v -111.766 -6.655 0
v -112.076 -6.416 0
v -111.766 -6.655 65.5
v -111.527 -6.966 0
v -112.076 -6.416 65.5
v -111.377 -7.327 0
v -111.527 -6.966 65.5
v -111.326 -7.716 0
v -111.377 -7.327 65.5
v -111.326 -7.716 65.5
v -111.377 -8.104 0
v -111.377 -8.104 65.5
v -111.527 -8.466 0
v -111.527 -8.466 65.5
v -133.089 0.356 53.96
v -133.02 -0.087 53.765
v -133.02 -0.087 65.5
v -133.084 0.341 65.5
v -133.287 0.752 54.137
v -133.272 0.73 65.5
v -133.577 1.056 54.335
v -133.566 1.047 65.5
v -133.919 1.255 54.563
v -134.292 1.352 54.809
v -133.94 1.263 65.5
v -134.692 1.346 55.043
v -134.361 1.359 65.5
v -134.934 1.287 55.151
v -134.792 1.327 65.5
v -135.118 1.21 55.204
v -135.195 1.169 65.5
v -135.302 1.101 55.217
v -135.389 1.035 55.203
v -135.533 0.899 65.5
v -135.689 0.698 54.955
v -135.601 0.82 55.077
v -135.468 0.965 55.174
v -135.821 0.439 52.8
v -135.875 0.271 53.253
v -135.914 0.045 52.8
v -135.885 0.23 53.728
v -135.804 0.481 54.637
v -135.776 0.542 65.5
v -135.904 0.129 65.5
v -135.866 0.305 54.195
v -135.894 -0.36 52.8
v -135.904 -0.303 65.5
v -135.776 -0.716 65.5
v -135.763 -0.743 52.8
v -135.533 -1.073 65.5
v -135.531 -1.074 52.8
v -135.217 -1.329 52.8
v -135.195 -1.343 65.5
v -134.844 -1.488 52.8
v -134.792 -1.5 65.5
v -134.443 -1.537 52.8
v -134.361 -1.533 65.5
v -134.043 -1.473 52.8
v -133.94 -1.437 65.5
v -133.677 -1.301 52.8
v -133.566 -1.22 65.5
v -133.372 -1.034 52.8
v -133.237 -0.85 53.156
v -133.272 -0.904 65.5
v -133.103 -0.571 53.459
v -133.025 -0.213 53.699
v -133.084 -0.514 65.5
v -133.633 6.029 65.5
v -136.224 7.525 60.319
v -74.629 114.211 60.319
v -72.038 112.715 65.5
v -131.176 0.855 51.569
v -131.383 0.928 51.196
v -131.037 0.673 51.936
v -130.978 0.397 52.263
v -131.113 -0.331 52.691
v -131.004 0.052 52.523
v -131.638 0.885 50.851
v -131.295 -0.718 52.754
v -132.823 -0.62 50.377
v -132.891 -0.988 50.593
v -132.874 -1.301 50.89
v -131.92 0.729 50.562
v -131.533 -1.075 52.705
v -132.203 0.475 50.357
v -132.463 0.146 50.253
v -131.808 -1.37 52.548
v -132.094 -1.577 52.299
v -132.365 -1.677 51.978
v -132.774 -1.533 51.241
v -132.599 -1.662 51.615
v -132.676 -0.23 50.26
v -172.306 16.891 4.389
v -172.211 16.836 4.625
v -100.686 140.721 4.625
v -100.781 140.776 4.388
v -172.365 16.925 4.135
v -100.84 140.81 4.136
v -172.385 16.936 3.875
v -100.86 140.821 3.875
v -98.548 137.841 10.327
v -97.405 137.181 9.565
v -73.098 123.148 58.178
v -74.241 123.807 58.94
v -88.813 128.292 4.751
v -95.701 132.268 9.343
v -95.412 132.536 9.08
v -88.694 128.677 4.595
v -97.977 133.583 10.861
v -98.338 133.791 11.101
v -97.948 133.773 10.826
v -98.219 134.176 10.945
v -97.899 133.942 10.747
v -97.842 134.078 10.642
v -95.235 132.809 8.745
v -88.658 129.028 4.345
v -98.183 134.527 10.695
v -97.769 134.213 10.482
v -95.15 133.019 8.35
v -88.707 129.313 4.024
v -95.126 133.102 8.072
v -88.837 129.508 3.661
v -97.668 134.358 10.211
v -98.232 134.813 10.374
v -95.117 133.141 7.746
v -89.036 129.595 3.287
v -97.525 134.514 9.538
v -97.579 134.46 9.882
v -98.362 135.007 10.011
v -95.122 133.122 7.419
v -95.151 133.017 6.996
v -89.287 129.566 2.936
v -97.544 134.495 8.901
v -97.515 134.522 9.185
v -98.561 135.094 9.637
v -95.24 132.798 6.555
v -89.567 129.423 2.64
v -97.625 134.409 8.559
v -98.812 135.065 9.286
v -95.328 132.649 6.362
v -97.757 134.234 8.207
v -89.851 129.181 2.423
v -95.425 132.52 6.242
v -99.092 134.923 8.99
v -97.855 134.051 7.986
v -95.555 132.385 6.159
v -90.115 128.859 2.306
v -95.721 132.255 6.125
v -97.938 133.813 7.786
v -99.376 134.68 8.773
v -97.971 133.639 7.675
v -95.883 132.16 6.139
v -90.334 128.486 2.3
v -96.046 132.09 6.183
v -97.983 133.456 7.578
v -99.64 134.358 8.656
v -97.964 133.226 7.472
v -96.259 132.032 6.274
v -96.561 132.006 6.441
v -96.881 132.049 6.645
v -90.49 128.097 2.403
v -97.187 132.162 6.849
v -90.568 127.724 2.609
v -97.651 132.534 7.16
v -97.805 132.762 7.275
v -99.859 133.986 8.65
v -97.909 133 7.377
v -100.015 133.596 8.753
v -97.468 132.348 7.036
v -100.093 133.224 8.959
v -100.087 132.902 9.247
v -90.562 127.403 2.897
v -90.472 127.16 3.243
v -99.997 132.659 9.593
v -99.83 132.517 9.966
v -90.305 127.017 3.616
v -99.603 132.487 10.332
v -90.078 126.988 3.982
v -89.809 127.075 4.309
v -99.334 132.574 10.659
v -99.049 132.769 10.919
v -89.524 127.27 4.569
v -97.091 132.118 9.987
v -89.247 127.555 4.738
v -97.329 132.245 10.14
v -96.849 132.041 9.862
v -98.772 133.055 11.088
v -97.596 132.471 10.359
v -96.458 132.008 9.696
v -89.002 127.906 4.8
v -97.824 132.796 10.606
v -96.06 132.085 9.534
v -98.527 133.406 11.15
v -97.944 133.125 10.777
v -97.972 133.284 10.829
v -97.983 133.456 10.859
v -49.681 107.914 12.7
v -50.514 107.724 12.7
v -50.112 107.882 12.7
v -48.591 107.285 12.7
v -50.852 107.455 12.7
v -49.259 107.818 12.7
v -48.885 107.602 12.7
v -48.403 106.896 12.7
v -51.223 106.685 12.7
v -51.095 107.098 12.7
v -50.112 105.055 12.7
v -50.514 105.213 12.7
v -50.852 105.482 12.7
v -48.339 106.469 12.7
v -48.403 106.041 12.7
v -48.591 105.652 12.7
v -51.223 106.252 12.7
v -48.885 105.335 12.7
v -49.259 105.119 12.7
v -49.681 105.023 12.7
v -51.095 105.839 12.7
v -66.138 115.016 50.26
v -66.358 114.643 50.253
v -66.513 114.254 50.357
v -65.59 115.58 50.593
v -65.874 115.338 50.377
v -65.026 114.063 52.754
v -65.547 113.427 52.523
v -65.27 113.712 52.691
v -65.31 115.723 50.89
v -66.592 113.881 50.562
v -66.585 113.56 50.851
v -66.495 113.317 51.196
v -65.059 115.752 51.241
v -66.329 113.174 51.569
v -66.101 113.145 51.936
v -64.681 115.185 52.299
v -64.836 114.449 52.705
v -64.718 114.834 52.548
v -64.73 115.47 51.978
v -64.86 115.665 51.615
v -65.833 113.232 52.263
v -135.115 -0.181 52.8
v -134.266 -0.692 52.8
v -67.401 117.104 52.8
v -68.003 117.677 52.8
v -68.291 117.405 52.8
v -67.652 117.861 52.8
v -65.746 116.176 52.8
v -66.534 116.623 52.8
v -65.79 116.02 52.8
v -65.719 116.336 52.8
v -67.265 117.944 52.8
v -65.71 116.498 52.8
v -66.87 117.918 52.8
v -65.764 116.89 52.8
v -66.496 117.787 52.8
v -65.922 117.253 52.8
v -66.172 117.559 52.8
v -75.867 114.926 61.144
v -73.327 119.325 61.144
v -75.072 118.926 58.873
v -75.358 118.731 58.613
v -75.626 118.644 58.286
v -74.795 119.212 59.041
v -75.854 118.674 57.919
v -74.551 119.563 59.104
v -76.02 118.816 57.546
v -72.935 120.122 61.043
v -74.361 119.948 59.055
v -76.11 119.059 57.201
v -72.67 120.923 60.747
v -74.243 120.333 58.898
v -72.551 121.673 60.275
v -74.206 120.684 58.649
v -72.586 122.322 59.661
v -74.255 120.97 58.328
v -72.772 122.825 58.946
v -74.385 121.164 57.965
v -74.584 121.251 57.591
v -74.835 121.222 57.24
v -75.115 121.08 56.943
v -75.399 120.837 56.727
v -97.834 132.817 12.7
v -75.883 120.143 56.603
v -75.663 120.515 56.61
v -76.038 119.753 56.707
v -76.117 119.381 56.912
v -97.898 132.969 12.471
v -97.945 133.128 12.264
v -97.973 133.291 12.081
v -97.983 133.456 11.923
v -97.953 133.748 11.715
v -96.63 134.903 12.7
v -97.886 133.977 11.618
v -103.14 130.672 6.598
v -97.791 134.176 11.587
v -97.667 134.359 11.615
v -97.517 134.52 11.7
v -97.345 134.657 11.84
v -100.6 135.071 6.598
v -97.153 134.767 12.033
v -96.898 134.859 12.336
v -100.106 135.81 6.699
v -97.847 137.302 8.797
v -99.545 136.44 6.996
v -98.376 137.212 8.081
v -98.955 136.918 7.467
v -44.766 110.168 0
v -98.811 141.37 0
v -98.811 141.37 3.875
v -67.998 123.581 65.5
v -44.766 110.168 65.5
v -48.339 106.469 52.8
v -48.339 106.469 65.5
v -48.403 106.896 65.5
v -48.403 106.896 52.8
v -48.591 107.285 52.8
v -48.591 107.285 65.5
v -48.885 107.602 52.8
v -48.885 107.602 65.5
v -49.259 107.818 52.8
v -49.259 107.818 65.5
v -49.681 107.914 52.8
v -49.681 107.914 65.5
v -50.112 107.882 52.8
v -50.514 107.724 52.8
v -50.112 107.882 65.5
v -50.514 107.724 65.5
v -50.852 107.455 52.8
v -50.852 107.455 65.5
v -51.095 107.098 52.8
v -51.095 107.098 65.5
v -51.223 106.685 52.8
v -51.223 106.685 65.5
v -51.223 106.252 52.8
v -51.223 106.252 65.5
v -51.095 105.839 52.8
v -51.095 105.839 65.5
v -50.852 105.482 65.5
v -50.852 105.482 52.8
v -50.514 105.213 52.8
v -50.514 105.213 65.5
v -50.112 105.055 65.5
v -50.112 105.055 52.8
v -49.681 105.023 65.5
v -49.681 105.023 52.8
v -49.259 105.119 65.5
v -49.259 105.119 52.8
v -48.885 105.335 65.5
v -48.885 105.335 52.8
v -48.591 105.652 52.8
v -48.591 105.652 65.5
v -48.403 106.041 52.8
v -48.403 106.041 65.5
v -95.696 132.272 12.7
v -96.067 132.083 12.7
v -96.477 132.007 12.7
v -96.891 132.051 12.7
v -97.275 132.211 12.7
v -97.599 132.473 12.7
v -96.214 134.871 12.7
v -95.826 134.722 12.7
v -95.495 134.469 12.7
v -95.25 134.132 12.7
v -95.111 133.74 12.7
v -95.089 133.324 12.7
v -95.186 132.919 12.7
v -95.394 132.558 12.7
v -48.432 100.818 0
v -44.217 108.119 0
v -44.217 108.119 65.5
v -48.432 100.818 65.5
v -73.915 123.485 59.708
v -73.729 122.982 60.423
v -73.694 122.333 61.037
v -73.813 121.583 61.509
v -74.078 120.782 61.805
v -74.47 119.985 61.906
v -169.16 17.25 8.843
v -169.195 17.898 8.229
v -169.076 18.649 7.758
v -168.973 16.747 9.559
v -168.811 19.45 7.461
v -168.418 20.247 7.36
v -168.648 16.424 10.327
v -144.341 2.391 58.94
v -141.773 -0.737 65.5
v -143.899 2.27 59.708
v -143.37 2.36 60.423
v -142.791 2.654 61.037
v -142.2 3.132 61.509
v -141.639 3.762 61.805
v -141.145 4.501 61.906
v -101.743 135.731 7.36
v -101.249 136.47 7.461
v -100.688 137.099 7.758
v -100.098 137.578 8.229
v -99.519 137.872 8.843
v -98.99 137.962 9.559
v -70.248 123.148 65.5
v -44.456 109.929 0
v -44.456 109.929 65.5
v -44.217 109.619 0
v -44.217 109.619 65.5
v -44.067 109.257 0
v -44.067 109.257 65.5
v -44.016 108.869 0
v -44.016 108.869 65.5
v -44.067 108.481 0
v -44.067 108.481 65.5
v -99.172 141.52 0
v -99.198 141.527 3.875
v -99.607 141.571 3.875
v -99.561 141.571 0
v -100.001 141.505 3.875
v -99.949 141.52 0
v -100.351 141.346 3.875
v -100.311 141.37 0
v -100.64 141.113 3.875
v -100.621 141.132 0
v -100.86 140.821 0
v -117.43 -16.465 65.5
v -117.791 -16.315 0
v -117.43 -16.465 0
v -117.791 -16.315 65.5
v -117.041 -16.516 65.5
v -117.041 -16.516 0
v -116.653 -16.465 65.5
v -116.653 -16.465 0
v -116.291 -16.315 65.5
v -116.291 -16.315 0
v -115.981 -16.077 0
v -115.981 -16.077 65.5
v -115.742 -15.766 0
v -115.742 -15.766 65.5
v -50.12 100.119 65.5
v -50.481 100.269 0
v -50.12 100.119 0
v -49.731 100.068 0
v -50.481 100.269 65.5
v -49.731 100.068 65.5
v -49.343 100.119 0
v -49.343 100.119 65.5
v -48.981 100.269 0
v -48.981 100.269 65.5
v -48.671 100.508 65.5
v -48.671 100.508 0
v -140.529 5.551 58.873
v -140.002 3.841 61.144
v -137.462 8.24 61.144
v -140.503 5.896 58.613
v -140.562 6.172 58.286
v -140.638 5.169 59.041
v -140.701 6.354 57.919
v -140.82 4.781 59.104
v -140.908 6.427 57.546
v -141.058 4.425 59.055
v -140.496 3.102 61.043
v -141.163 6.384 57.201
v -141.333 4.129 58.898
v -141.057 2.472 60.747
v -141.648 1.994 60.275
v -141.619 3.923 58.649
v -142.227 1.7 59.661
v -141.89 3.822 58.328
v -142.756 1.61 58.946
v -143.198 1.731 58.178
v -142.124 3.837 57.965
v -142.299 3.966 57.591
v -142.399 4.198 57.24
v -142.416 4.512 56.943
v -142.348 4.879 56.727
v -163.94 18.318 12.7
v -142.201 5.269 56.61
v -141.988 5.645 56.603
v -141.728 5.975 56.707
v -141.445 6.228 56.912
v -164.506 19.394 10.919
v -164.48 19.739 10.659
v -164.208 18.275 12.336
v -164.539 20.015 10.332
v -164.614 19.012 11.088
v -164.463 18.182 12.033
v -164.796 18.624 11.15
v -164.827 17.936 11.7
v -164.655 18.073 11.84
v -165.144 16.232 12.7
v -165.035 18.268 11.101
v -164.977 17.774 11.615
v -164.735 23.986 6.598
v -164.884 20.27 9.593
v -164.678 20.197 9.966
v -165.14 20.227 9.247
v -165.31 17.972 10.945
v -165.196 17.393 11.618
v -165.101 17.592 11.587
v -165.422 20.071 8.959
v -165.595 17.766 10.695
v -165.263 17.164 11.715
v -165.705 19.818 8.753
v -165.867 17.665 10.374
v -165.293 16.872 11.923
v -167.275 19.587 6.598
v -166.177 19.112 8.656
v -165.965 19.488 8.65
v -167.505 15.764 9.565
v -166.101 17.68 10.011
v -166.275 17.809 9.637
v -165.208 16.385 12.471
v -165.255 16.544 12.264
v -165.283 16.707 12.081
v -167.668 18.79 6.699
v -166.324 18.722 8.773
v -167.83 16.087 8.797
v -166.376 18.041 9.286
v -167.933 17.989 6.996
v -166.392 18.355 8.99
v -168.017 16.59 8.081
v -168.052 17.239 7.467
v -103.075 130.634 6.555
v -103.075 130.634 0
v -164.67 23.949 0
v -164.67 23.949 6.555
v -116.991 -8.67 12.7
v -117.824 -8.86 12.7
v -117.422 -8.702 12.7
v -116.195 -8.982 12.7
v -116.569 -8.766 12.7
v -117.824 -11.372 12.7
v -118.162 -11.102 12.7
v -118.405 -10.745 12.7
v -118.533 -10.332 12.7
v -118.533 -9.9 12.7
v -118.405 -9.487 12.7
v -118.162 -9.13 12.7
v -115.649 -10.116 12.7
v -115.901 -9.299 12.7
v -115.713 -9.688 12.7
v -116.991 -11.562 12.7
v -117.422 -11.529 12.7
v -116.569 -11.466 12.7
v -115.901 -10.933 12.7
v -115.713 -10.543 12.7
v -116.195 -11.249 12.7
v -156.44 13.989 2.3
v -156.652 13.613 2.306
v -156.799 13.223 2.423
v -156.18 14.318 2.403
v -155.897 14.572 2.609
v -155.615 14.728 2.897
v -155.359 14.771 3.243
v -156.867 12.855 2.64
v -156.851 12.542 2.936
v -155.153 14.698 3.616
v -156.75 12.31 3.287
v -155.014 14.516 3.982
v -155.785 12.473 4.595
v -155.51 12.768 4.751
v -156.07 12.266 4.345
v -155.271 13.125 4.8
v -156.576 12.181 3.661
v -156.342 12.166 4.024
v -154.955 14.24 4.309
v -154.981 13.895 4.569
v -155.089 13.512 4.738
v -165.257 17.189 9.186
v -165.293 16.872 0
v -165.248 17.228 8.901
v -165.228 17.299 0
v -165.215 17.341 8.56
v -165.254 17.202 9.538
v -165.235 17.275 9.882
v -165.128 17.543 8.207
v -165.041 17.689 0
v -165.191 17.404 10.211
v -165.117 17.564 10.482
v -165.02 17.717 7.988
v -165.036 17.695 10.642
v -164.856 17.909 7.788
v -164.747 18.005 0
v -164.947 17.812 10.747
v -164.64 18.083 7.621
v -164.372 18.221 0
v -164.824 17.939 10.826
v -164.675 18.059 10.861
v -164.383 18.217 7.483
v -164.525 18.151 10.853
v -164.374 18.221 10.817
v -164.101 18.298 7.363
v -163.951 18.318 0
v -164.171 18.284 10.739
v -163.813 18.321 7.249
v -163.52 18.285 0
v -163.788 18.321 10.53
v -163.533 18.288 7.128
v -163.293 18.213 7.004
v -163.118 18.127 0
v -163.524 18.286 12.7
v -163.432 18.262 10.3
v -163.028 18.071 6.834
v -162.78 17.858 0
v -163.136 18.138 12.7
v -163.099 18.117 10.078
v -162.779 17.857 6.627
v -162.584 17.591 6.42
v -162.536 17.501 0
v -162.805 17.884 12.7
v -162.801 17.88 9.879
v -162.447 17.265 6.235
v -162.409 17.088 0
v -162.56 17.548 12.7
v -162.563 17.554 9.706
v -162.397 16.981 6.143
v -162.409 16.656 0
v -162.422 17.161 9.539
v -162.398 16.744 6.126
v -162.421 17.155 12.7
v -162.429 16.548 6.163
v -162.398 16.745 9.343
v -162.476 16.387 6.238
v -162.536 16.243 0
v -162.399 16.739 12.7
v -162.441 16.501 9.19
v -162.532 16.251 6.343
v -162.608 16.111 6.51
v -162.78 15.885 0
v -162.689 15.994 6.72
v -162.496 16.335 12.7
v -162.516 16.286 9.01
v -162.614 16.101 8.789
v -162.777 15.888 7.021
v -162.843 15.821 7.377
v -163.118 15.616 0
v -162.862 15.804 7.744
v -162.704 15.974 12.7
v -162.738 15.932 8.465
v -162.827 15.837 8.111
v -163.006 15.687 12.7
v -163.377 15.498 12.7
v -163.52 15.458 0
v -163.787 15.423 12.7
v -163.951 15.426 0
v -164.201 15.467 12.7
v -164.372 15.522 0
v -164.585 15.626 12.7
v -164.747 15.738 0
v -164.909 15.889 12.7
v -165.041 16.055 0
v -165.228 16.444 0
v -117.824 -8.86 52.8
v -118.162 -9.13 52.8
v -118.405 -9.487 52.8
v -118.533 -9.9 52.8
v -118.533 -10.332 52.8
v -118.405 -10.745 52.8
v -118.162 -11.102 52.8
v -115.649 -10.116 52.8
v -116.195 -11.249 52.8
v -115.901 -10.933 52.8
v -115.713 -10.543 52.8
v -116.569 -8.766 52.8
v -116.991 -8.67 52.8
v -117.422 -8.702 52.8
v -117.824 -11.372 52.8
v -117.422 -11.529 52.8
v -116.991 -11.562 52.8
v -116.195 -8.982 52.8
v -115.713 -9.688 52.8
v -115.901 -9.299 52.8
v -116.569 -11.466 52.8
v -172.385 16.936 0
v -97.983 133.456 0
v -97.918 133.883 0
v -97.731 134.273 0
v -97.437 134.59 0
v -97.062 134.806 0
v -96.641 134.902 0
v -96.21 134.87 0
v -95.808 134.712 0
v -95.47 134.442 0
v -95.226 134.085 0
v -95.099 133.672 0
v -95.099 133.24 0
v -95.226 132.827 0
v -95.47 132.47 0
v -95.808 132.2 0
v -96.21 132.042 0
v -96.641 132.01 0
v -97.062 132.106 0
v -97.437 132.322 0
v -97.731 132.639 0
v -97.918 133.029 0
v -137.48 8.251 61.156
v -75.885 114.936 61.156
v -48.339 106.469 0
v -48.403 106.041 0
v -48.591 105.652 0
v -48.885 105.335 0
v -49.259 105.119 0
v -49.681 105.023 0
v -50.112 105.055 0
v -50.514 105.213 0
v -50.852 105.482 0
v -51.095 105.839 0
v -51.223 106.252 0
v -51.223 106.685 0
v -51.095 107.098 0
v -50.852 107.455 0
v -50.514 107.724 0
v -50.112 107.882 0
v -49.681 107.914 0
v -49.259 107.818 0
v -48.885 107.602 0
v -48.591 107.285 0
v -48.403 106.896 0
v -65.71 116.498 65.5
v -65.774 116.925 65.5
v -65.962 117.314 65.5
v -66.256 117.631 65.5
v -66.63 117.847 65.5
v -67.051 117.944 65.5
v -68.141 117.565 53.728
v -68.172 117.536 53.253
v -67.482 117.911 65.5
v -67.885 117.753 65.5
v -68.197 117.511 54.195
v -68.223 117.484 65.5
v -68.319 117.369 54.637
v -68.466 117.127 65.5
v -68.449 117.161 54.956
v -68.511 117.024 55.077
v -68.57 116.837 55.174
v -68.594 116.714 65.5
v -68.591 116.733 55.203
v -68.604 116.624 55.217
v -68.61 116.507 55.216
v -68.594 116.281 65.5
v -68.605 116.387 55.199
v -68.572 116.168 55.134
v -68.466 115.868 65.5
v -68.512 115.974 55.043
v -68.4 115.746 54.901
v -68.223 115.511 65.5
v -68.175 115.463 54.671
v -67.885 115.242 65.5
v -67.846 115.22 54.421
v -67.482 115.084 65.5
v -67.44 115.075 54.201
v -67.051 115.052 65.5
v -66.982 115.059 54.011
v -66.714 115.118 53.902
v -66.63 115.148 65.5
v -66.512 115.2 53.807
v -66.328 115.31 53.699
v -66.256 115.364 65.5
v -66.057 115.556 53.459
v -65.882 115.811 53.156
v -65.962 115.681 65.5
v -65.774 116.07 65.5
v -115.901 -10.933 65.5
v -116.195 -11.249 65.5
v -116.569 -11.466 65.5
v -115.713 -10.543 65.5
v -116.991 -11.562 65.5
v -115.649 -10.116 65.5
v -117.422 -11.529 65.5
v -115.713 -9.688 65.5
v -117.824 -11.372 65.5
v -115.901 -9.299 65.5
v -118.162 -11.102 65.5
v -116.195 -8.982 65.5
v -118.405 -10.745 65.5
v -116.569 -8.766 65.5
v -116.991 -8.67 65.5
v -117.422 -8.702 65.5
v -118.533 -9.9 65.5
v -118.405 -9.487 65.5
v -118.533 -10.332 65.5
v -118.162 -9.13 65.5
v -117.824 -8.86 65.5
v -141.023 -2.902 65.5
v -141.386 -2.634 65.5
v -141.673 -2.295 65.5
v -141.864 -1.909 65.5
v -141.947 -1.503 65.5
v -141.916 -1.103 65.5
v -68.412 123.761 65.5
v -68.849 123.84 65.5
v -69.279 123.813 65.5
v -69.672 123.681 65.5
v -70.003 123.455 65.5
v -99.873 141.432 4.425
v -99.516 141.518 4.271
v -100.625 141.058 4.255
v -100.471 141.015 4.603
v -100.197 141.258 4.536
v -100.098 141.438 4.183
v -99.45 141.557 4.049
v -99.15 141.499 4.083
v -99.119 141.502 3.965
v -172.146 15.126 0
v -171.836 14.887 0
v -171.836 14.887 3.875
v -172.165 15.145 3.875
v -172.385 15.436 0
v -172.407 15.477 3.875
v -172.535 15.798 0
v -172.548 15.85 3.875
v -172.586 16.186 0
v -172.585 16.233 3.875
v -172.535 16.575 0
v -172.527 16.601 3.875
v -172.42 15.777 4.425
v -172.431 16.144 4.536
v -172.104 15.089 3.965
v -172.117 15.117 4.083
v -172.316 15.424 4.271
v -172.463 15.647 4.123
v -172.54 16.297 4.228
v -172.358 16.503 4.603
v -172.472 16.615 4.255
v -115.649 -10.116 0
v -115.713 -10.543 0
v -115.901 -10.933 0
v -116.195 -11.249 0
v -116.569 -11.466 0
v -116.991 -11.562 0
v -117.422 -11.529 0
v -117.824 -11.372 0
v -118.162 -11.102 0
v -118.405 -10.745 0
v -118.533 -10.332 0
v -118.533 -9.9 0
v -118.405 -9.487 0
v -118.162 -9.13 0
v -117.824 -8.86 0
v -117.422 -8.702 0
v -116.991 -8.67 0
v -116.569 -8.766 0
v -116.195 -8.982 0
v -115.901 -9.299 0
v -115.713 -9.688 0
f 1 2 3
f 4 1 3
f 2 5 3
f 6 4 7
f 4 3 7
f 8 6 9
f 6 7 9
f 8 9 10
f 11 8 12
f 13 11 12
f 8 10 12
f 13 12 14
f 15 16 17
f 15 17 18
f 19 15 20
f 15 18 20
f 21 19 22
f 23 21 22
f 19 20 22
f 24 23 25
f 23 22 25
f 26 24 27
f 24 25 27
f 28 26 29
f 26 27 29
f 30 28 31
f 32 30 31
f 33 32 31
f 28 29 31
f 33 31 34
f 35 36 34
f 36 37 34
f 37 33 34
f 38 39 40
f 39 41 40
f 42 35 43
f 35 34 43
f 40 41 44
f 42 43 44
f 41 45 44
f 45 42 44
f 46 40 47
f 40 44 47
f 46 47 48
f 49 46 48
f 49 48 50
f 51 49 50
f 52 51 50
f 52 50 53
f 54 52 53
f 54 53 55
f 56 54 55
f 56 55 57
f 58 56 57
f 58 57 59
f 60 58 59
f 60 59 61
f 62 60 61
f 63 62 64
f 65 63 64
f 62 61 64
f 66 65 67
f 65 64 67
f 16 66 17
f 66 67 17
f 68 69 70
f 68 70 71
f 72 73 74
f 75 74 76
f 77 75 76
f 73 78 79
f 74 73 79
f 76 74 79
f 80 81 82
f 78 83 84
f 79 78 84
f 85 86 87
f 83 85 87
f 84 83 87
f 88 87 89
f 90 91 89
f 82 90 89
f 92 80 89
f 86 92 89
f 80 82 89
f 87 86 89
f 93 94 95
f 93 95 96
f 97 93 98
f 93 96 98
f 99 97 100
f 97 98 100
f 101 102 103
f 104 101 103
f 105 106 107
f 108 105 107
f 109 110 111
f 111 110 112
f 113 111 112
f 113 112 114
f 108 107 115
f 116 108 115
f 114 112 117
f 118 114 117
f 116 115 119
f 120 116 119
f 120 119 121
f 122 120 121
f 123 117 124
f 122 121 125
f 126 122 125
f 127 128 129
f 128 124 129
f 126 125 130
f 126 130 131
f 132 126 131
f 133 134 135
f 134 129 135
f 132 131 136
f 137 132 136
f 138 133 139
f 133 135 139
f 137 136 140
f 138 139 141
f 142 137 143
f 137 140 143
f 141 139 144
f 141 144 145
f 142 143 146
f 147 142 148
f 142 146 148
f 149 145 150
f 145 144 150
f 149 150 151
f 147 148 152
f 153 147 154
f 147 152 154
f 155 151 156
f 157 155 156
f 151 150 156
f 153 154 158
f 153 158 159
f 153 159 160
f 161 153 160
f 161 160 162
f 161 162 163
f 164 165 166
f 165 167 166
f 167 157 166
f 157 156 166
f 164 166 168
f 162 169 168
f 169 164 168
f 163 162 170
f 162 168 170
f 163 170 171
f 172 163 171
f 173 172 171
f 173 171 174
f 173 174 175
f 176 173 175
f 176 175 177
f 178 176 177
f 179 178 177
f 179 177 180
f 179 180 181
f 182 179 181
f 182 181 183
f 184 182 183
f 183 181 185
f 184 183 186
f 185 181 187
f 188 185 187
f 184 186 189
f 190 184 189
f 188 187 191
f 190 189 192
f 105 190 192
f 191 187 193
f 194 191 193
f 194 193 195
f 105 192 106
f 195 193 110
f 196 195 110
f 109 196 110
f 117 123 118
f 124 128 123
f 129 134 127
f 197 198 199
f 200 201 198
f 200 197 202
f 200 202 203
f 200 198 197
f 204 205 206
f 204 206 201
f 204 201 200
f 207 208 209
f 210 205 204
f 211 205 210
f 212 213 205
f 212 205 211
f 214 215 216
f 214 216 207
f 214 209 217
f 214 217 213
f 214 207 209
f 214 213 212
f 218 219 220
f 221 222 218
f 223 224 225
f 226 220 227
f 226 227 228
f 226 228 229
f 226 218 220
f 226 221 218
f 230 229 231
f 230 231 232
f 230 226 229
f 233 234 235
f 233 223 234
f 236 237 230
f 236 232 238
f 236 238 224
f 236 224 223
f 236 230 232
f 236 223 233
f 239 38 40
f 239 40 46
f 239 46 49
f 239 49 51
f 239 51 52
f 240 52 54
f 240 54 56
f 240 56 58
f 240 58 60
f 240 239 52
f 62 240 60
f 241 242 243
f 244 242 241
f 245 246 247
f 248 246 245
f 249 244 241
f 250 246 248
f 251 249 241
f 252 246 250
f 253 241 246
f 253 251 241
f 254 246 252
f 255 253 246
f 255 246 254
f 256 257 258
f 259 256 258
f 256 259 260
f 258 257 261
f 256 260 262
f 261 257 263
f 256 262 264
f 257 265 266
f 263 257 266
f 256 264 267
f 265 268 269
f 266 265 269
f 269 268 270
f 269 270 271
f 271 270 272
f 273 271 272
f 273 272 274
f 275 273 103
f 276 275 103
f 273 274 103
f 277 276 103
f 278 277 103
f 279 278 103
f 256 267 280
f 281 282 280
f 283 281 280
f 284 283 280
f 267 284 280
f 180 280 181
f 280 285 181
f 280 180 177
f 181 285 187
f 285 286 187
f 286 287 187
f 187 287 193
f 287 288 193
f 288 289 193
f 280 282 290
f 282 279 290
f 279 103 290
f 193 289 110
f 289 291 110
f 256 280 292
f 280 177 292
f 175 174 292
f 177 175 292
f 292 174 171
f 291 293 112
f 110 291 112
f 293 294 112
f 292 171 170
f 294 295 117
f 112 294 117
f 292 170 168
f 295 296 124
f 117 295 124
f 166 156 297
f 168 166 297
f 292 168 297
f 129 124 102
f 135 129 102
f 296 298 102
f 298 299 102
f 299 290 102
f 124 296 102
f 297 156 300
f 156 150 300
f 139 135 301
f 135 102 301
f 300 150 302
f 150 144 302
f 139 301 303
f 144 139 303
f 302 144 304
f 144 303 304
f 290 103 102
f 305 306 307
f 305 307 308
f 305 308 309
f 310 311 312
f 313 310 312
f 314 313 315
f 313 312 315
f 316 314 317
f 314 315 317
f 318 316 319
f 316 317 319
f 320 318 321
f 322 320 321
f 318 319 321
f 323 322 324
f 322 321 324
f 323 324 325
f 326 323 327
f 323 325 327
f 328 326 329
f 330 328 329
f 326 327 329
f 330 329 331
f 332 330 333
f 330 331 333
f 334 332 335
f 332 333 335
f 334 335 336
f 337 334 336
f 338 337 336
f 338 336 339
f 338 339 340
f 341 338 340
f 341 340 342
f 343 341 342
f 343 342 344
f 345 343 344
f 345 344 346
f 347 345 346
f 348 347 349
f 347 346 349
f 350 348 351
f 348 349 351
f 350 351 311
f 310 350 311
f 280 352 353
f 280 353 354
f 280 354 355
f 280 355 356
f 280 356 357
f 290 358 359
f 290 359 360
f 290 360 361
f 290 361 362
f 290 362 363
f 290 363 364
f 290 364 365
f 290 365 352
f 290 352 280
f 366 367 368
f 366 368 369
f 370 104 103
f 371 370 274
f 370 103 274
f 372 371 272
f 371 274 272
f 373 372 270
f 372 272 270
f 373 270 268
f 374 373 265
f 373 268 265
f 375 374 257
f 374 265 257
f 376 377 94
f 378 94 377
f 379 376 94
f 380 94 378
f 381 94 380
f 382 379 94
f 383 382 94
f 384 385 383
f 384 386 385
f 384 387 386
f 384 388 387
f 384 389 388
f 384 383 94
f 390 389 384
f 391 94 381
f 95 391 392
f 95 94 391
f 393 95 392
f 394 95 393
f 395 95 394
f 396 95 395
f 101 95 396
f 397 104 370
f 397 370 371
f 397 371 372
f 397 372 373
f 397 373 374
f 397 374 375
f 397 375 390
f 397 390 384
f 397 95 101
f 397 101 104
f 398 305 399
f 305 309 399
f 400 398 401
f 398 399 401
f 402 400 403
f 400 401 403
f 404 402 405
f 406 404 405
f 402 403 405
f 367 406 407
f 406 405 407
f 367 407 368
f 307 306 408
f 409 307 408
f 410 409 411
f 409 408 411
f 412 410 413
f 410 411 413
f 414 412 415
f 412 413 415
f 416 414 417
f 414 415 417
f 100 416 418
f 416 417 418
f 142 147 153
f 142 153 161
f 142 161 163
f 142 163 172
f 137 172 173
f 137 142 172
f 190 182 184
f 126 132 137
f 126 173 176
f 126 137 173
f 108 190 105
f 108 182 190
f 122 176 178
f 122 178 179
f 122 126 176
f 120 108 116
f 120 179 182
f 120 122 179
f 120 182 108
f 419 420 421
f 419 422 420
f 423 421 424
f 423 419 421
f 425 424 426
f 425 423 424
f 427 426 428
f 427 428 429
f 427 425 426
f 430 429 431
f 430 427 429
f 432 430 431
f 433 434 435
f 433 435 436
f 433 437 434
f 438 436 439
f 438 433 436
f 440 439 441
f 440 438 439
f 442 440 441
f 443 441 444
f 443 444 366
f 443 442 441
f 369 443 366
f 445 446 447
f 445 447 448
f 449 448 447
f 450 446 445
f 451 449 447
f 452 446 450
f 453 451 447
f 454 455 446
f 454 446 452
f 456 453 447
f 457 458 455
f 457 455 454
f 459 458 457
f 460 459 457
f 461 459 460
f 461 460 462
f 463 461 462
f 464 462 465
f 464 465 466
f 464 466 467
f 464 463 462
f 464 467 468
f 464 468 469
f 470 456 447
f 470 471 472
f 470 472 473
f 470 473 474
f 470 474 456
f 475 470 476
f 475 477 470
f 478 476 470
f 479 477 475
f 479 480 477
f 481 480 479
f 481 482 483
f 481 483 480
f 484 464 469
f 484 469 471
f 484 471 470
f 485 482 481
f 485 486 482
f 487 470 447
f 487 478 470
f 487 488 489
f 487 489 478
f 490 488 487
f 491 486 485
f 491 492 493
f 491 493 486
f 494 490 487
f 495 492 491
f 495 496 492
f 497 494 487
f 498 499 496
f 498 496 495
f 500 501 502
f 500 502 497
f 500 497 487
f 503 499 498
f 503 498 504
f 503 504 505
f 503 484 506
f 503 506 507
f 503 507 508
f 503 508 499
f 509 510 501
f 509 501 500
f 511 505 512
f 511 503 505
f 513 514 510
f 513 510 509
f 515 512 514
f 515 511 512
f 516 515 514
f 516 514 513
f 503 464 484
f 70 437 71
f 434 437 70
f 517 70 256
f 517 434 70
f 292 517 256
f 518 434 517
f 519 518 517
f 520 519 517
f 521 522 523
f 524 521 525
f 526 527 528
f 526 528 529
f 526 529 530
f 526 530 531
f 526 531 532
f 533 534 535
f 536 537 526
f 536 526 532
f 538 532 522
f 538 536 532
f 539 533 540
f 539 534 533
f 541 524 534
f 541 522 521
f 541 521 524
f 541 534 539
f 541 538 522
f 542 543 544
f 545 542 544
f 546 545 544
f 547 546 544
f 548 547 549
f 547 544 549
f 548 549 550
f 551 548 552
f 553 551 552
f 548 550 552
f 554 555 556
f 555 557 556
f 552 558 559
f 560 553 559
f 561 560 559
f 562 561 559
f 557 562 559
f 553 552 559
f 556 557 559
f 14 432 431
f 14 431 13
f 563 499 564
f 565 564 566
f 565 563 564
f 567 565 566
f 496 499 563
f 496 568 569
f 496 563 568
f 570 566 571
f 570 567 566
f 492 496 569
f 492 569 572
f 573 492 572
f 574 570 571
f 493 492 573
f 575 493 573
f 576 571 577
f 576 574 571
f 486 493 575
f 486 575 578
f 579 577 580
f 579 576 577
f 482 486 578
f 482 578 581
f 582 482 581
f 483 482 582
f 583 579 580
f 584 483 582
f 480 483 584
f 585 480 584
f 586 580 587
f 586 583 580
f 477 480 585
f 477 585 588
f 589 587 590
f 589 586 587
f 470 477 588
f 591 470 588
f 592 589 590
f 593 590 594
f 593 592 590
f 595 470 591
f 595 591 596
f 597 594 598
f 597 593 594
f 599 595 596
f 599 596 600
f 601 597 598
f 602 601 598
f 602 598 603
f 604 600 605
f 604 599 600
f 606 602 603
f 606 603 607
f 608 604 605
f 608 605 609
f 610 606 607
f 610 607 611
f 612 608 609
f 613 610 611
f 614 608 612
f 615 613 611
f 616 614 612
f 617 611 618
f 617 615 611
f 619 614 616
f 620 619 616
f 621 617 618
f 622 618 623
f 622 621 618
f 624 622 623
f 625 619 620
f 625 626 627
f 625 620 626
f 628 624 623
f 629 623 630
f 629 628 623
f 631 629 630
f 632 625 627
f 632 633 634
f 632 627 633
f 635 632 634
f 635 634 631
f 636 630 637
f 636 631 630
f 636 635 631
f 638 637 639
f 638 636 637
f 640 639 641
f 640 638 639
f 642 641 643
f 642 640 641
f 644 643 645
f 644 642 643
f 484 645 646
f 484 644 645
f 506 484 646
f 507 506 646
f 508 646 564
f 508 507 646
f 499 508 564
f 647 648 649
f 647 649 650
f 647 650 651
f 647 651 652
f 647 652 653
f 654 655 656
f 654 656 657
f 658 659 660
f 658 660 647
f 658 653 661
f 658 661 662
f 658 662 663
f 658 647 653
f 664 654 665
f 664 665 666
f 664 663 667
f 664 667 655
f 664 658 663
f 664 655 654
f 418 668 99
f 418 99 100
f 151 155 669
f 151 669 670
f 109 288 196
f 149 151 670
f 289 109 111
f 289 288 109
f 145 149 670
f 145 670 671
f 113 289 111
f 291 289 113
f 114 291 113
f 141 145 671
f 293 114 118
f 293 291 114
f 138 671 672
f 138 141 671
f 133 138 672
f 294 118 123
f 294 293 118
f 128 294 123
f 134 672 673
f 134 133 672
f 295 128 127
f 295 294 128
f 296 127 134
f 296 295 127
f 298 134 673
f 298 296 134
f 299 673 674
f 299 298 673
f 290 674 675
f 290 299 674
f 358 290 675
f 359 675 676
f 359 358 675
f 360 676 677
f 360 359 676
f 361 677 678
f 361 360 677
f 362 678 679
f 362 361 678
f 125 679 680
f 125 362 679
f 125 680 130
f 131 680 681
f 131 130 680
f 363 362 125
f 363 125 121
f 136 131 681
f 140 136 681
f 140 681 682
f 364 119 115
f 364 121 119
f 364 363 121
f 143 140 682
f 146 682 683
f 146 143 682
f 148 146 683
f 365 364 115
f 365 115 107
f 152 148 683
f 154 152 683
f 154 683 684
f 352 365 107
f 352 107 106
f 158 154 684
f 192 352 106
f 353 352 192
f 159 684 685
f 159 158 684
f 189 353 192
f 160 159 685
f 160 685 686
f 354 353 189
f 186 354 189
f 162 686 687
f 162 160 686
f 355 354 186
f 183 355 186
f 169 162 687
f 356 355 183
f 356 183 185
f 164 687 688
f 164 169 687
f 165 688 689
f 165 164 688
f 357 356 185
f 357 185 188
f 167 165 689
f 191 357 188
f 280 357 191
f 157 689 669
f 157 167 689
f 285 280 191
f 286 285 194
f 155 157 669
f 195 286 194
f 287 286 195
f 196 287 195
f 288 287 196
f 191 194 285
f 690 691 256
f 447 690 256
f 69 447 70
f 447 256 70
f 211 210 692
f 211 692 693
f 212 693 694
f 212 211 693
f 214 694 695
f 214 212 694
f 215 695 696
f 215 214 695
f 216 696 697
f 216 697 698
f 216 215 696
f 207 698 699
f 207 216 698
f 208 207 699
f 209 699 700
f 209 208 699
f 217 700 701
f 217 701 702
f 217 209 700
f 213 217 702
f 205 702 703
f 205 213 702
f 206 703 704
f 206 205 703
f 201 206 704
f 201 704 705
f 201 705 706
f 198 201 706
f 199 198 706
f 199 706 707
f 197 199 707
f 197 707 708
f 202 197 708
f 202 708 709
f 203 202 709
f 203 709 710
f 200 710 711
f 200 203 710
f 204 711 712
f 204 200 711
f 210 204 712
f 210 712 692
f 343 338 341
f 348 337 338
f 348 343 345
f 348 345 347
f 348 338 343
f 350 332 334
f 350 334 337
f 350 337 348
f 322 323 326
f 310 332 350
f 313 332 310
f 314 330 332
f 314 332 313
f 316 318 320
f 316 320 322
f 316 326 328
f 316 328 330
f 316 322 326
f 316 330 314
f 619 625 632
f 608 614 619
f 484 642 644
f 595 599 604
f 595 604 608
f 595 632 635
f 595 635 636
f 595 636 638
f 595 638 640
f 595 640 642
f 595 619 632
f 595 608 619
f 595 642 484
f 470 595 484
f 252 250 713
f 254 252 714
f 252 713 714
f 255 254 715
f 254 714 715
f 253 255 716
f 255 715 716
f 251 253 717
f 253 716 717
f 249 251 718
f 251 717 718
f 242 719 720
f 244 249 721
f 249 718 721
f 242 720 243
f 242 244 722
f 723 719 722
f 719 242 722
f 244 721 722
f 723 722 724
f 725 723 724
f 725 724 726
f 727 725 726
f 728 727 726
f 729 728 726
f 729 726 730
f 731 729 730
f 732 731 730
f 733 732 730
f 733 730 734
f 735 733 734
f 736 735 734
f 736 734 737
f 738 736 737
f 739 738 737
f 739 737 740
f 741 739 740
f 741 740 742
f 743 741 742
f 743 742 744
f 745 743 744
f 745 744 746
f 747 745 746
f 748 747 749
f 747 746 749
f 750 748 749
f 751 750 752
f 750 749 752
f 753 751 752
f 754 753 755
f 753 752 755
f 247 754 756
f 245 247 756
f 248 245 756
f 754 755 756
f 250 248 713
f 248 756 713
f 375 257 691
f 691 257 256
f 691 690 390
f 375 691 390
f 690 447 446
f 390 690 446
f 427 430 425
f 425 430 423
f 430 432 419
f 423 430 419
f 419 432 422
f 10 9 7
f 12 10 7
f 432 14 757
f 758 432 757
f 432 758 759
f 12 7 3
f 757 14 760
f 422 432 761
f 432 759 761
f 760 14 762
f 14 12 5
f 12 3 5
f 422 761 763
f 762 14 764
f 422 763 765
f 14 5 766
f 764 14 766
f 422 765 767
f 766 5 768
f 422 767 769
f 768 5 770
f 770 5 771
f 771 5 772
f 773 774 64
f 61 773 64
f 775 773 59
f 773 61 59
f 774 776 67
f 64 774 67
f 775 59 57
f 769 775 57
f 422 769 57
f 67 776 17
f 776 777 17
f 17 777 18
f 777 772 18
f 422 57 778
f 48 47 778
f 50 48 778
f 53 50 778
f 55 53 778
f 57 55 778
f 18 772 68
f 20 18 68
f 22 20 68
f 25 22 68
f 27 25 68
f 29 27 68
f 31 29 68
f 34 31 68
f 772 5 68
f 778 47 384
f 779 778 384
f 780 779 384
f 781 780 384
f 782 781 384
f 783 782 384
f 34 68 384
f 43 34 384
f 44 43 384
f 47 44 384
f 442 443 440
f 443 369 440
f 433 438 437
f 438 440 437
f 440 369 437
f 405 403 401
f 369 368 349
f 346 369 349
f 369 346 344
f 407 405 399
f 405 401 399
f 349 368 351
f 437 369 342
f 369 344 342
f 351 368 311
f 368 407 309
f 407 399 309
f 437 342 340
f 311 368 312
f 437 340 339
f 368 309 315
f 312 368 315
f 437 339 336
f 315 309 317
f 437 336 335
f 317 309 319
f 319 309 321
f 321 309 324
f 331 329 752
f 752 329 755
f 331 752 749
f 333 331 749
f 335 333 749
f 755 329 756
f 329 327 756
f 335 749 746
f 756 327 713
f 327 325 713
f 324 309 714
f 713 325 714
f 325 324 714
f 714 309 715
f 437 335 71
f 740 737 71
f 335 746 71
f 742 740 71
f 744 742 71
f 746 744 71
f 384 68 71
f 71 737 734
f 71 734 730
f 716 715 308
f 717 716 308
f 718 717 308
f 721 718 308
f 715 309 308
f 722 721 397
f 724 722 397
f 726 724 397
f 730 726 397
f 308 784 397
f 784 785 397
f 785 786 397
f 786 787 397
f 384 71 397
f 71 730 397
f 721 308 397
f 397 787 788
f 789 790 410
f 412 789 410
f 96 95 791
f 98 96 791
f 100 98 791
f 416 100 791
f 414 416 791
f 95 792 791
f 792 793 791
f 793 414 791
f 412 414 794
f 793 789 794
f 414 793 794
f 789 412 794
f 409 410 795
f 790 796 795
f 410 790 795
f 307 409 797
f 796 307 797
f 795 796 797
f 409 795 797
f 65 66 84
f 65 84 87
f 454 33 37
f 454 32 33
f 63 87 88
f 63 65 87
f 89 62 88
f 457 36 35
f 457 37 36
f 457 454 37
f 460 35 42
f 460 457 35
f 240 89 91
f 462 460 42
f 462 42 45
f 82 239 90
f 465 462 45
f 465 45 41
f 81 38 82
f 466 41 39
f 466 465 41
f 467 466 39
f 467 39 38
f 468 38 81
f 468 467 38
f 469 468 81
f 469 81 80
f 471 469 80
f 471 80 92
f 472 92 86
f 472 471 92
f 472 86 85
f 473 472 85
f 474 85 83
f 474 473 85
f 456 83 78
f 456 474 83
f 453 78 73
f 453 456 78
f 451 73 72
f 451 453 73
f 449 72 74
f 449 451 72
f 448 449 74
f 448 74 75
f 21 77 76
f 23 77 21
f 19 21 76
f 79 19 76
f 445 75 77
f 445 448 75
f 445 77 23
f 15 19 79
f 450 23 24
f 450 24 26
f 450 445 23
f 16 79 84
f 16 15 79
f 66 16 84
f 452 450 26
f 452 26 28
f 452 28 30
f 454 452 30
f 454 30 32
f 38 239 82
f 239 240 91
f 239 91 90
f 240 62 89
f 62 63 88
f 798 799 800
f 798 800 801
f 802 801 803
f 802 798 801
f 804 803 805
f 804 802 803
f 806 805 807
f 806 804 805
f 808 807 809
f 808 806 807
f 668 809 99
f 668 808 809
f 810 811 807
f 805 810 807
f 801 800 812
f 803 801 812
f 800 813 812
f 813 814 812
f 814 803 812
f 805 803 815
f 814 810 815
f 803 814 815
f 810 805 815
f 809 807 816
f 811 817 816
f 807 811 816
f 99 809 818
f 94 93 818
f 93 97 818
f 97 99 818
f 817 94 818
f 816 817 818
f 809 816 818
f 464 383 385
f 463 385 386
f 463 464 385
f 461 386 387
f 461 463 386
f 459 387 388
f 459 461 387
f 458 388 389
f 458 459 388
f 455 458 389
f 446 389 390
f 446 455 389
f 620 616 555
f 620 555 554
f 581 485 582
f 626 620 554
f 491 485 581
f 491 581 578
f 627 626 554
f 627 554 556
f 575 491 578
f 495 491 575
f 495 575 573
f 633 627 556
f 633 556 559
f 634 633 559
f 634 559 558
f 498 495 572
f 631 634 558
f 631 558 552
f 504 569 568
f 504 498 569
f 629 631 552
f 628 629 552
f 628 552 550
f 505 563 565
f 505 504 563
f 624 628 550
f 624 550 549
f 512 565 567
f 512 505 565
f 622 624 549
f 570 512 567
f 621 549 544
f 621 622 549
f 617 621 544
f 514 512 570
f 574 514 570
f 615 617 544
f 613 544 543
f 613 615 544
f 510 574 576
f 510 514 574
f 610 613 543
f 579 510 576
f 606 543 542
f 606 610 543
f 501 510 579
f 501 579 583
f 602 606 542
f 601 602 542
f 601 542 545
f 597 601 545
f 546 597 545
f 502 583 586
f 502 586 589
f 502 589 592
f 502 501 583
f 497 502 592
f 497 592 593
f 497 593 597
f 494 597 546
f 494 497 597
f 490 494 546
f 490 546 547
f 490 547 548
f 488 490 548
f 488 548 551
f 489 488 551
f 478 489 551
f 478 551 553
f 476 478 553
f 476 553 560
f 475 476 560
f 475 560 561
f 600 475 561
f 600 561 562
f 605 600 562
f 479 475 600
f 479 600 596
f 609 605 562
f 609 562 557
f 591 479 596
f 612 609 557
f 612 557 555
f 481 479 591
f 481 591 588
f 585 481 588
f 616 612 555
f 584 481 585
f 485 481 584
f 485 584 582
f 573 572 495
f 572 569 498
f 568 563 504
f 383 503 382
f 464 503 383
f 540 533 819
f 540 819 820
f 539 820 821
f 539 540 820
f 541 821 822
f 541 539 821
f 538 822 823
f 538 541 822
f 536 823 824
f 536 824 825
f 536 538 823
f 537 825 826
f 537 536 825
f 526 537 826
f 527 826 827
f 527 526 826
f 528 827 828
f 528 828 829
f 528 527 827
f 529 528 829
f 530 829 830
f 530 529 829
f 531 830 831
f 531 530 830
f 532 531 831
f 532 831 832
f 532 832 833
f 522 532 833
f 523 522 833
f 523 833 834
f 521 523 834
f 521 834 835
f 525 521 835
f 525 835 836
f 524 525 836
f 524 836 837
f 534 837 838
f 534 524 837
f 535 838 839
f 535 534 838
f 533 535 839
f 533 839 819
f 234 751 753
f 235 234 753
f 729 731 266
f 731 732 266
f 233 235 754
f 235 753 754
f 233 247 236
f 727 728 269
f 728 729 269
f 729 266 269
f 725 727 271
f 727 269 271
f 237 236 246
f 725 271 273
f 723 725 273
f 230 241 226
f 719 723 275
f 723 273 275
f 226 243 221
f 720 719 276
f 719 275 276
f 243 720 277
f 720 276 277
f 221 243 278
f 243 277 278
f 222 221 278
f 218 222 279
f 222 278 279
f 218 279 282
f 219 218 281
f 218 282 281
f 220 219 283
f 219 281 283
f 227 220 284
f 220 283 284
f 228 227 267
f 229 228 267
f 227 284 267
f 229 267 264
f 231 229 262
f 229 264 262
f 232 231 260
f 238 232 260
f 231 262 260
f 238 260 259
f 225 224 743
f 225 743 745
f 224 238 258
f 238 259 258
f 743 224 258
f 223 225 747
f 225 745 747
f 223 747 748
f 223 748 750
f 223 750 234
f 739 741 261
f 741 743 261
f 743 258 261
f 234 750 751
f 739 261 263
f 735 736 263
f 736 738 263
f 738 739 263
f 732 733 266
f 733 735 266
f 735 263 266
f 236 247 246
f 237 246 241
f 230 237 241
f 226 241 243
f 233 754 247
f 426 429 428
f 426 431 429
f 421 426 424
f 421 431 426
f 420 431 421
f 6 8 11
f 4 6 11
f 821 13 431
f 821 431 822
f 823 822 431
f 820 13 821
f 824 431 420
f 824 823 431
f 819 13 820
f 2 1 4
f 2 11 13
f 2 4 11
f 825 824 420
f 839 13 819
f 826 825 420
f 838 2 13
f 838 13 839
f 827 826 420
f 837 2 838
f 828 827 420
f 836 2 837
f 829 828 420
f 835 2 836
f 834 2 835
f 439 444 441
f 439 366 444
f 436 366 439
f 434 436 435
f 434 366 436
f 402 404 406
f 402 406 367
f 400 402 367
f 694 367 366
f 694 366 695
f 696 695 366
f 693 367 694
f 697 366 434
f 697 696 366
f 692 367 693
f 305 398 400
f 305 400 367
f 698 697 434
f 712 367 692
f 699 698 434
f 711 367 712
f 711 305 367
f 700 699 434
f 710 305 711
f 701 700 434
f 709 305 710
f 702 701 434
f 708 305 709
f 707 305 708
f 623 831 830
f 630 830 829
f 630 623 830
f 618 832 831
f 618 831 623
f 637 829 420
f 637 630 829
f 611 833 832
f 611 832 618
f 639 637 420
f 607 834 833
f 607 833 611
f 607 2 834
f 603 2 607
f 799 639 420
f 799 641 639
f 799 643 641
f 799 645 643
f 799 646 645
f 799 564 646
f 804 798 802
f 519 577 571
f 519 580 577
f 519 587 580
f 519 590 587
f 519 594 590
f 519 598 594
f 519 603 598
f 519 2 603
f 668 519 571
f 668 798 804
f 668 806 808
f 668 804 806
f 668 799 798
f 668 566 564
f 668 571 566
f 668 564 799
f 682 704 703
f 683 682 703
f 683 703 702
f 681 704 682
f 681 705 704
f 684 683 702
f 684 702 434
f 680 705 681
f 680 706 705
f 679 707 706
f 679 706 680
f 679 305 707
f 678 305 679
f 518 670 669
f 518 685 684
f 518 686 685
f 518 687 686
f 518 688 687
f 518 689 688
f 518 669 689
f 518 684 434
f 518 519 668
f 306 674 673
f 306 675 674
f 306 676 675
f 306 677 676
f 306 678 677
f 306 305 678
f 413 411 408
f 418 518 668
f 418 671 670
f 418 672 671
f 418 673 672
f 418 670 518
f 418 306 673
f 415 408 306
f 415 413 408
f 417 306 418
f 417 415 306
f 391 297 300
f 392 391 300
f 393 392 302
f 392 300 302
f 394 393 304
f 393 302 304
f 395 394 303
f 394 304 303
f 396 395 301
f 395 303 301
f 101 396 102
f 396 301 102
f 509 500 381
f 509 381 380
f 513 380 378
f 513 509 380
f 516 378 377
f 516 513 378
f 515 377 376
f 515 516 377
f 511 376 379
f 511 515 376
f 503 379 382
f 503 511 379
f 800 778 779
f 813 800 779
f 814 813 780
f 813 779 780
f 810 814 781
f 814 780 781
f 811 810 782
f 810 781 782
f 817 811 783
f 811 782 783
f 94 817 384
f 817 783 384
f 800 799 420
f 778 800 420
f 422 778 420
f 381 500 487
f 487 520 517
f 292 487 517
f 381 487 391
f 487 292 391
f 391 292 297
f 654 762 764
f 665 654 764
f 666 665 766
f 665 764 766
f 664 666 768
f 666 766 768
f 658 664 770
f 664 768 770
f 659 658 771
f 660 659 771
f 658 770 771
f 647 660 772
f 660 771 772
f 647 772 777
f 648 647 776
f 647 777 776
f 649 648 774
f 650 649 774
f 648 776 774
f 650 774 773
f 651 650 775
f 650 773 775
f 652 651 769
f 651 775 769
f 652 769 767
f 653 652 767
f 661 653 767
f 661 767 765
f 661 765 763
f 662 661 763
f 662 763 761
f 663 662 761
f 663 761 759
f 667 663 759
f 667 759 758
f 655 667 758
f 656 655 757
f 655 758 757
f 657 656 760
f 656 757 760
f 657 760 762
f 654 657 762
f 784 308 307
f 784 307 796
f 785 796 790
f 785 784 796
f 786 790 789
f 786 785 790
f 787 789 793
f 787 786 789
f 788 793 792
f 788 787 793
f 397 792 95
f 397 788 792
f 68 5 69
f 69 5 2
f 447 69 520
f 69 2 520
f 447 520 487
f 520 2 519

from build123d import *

# Parameters (mm, degrees)
BOSS_EXTRUDE1_DEPTH      = 65.5
CUT_EXTRUDE1_DEPTH       = 123.81081001013399
SKETCH5_W                = 286.8159556552996
SKETCH5_H                = 274.5057689508883
CUT_EXTRUDE2_DEPTH       = 124.35386359594037
FILLET1_R                = 1.5
SKETCH6_R                = 1.4499999999976838
SKETCH6_R_2              = 1.4499999999976672
CUT_EXTRUDE3_DEPTH       = 12.7
FILLET2_R                = 1.5
BOSS_EXTRUDE2_DEPTH      = 129.03199999999995
BOSS_EXTRUDE2_DEPTH_BACK = 6.35
FILLET3_R                = 1.5
SKETCH9_R                = 1.4499999999972695
SKETCH9_R_2              = 1.450000000000002
SKETCH9_R_3              = 1.44999999999727
SKETCH9_R_4              = 1.4500000000000004
CUT_EXTRUDE4_DEPTH       = 12.7
CUT_EXTRUDE5_START       = -12.7
SKETCH12_R               = 1.4500000000000008
SKETCH12_R_2             = 1.4499999999999993
SKETCH12_R_3             = 1.450000000000002
CUT_EXTRUDE5_DEPTH       = 12.7


with BuildPart() as part:
    # Sketch2 → Boss-Extrude1 (new body)
    with BuildSketch(Plane.XY):
        Polygon((-105.82469127018673, 132.22169365322222), (-100.10969127018673, 142.12036401847837), (-43.467299735665506, 109.41786401847837), (-49.1822997356655, 99.51919365322226), align=None)
    extrude(amount=BOSS_EXTRUDE1_DEPTH)

    # Sketch4 → Cut-Extrude1 (cut, through all)
    with BuildSketch(Plane(origin=(-102.92764878057318, 59.4253057305198, 68.61843252038122), x_dir=(-0.43301270189221336, 0.2499999999999988, -0.866025403784442), z_dir=(0.750000000000001, -0.4330127018922244, -0.4999999999999942))):
        with BuildLine():
            Line((12.055567275641103, -70.09999999999997), (68.18956727564095, -70.09999999999998))
            ThreePointArc((68.18956727564095, -70.09999999999998), (70.61140800120485, -69.0968407255639), (71.61456727564105, -66.675))
            Line((71.61456727564105, -66.675), (71.61456727564108, 66.67500000000005))
            ThreePointArc((71.61456727564108, 66.67500000000005), (70.611408001205, 69.096840725564), (68.18956727564107, 70.10000000000008))
            Line((68.18956727564107, 70.10000000000008), (12.055567275641172, 70.10000000000008))
            ThreePointArc((12.055567275641172, 70.10000000000008), (9.63372655007727, 69.096840725564), (8.630567275641152, 66.67500000000008))
            Line((8.630567275641152, 66.67500000000008), (8.630567275641091, -66.67499999999998))
            ThreePointArc((8.630567275641091, -66.67499999999998), (9.633726550077167, -69.09684072556392), (12.055567275641103, -70.09999999999997))
        make_face()
    extrude(amount=-CUT_EXTRUDE1_DEPTH, mode=Mode.SUBTRACT)

    # Sketch5 → Cut-Extrude2 (cut, through all)
    with BuildSketch(Plane(origin=(-104.07064878057318, 60.08521708820357, 69.38043252038125), x_dir=(0.43301270189221336, -0.2499999999999988, 0.866025403784442), z_dir=(-0.750000000000001, 0.43301270189222446, 0.4999999999999942))):
        with Locations((-47.42628955617079, -22.345577128817233)):
            Rectangle(SKETCH5_W, SKETCH5_H)
    extrude(amount=CUT_EXTRUDE2_DEPTH, mode=Mode.SUBTRACT)

    # Fillet1
    fillet1_edges = [part.edges().sort_by_distance(p)[0] for p in [
        (-43.467299735665506, 109.41786401847837, 32.75),
        (-84.80402815547504, 133.28363529907386, 34.88867377057616),
        (-76.11182953811208, 115.06696493381483, 63.70307100530266),
        (-49.1822997356655, 99.51919365322226, 32.75),
    ]]
    fillet(fillet1_edges, radius=FILLET1_R)

    # Sketch6 → Cut-Extrude3 (cut)
    with BuildSketch(Plane(origin=(-102.92764878057321, 59.42530573051982, 68.61843252038126), x_dir=(0.4330127018922132, -0.24999999999999897, 0.866025403784442), z_dir=(-0.750000000000001, 0.4330127018922244, 0.4999999999999942))):
        with Locations(Location((-12.4365672756387, 66.29527000000009, 0), (0, 0, 16.102113752))):
            Circle(SKETCH6_R)
        with Locations(Location((-67.80856727563872, 66.29527000000007, 0), (0, 0, 16.102113752))):
            Circle(SKETCH6_R_2)
    extrude(amount=-CUT_EXTRUDE3_DEPTH, mode=Mode.SUBTRACT)

    # Fillet2
    # the kernel refuses this fillet: 1.5 mm, written as the material it takes off along each edge
    with BuildSketch(Plane(origin=(-100.10969127018673, 142.12036401847837, -3.75), x_dir=(-0.5, -0.8660254037844387, 0), z_dir=(0, 0, 1))) as fillet2_piece_1:
        with BuildLine():
            CenterArc((FILLET2_R, FILLET2_R), FILLET2_R, 180, 90)
            Line((3e-17, FILLET2_R), (0, 0))
            Line((0, 0), (FILLET2_R, 0))
        make_face()
    extrude(amount=8.777347541152302, mode=Mode.SUBTRACT)


with BuildPart() as body_2:
    # Mirror2: mirrored copy
    add(part.part.mirror(Plane(origin=(0, 0, 0), x_dir=(1e-16, 1.8e-16, 1), z_dir=(0.500000000000004, 0.8660254037844364, 0))))


with BuildPart() as part_1:
    add(part.part)

    add(body_2.part)  # Boss-Extrude2 merges body 2
    # Sketch8 → Boss-Extrude2 (add, two sides: drawn at the far end of the back side and taken through both)
    with BuildSketch(Plane(origin=(30.797500000000397, 53.34283474610328, 0), x_dir=(0.866025403784437, -0.5000000000000029, 0), z_dir=(-0.5000000000000029, -0.866025403784437, 0)).offset(-BOSS_EXTRUDE2_DEPTH_BACK)):
        Polygon((-154.5827178142381, 6.554994353133541), (-155.97771781422597, 7.360397978646052), (-157.7577178142381, 4.277347541152373), (-157.7577178142381, 0), (-154.58271781423835, 0), align=None)
        Polygon((-123.18667970854972, 61.15614201060529), (-121.73608733433291, 60.31864170382078), (-118.74462872726596, 65.50000000000001), (-120.67875212905116, 65.50000000000001), (-122.41080293662007, 65.50000000000001), (-124.48571781422638, 61.90614201060528), align=None)
    extrude(amount=BOSS_EXTRUDE2_DEPTH + BOSS_EXTRUDE2_DEPTH_BACK)

    # Fillet3
    fillet3_edges = [part_1.edges().sort_by_distance(p)[0] for p in [
        (-172.53112429253738, 15.785626111925975, 4.1571540602531725),
        (-136.62219127018705, 78.87885890711985, 4.277347541152341),
        (-99.93631537383828, 141.5235235248658, 4.157154060253142),
    ]]
    fillet(fillet3_edges, radius=FILLET3_R)

    # Sketch9 → Cut-Extrude4 (cut)
    with BuildSketch(Plane.XY.offset(65.50000000000001)):
        with Locations((-67.1597126180574, 116.49757139704164)):
            Circle(SKETCH9_R)
        with Locations((-49.7889013508033, 106.4685288358503)):
            Circle(SKETCH9_R_2)
        with Locations((-134.46971261805777, -0.08676846042013409)):
            Circle(SKETCH9_R_3)
        with Locations((-117.0989013508037, -10.115811021611455)):
            Circle(SKETCH9_R_4)
    extrude(amount=-CUT_EXTRUDE4_DEPTH, mode=Mode.SUBTRACT)

    # Sketch12 → Cut-Extrude5 (cut)
    with BuildSketch(Plane(origin=(0, 0, 0), x_dir=(-1, 0, 0), z_dir=(0, 0, -1)).offset(CUT_EXTRUDE5_START)):
        with Locations((163.84262252006926, 16.871688978388832)):
            Circle(SKETCH12_R)
        with Locations(Location((117.09890135080418, -10.115811021611187, 0), (0, 0, 180))):
            Circle(SKETCH12_R_2)
        with Locations((96.53262252006812, 133.4560288358508)):
            Circle(SKETCH12_R_3)
        with Locations(Location((49.78890135080324, 106.46852883585038, 0), (0, 0, 180))):
            Circle(SKETCH12_R_3)
    extrude(amount=CUT_EXTRUDE5_DEPTH, mode=Mode.SUBTRACT)


solid = part_1.part
